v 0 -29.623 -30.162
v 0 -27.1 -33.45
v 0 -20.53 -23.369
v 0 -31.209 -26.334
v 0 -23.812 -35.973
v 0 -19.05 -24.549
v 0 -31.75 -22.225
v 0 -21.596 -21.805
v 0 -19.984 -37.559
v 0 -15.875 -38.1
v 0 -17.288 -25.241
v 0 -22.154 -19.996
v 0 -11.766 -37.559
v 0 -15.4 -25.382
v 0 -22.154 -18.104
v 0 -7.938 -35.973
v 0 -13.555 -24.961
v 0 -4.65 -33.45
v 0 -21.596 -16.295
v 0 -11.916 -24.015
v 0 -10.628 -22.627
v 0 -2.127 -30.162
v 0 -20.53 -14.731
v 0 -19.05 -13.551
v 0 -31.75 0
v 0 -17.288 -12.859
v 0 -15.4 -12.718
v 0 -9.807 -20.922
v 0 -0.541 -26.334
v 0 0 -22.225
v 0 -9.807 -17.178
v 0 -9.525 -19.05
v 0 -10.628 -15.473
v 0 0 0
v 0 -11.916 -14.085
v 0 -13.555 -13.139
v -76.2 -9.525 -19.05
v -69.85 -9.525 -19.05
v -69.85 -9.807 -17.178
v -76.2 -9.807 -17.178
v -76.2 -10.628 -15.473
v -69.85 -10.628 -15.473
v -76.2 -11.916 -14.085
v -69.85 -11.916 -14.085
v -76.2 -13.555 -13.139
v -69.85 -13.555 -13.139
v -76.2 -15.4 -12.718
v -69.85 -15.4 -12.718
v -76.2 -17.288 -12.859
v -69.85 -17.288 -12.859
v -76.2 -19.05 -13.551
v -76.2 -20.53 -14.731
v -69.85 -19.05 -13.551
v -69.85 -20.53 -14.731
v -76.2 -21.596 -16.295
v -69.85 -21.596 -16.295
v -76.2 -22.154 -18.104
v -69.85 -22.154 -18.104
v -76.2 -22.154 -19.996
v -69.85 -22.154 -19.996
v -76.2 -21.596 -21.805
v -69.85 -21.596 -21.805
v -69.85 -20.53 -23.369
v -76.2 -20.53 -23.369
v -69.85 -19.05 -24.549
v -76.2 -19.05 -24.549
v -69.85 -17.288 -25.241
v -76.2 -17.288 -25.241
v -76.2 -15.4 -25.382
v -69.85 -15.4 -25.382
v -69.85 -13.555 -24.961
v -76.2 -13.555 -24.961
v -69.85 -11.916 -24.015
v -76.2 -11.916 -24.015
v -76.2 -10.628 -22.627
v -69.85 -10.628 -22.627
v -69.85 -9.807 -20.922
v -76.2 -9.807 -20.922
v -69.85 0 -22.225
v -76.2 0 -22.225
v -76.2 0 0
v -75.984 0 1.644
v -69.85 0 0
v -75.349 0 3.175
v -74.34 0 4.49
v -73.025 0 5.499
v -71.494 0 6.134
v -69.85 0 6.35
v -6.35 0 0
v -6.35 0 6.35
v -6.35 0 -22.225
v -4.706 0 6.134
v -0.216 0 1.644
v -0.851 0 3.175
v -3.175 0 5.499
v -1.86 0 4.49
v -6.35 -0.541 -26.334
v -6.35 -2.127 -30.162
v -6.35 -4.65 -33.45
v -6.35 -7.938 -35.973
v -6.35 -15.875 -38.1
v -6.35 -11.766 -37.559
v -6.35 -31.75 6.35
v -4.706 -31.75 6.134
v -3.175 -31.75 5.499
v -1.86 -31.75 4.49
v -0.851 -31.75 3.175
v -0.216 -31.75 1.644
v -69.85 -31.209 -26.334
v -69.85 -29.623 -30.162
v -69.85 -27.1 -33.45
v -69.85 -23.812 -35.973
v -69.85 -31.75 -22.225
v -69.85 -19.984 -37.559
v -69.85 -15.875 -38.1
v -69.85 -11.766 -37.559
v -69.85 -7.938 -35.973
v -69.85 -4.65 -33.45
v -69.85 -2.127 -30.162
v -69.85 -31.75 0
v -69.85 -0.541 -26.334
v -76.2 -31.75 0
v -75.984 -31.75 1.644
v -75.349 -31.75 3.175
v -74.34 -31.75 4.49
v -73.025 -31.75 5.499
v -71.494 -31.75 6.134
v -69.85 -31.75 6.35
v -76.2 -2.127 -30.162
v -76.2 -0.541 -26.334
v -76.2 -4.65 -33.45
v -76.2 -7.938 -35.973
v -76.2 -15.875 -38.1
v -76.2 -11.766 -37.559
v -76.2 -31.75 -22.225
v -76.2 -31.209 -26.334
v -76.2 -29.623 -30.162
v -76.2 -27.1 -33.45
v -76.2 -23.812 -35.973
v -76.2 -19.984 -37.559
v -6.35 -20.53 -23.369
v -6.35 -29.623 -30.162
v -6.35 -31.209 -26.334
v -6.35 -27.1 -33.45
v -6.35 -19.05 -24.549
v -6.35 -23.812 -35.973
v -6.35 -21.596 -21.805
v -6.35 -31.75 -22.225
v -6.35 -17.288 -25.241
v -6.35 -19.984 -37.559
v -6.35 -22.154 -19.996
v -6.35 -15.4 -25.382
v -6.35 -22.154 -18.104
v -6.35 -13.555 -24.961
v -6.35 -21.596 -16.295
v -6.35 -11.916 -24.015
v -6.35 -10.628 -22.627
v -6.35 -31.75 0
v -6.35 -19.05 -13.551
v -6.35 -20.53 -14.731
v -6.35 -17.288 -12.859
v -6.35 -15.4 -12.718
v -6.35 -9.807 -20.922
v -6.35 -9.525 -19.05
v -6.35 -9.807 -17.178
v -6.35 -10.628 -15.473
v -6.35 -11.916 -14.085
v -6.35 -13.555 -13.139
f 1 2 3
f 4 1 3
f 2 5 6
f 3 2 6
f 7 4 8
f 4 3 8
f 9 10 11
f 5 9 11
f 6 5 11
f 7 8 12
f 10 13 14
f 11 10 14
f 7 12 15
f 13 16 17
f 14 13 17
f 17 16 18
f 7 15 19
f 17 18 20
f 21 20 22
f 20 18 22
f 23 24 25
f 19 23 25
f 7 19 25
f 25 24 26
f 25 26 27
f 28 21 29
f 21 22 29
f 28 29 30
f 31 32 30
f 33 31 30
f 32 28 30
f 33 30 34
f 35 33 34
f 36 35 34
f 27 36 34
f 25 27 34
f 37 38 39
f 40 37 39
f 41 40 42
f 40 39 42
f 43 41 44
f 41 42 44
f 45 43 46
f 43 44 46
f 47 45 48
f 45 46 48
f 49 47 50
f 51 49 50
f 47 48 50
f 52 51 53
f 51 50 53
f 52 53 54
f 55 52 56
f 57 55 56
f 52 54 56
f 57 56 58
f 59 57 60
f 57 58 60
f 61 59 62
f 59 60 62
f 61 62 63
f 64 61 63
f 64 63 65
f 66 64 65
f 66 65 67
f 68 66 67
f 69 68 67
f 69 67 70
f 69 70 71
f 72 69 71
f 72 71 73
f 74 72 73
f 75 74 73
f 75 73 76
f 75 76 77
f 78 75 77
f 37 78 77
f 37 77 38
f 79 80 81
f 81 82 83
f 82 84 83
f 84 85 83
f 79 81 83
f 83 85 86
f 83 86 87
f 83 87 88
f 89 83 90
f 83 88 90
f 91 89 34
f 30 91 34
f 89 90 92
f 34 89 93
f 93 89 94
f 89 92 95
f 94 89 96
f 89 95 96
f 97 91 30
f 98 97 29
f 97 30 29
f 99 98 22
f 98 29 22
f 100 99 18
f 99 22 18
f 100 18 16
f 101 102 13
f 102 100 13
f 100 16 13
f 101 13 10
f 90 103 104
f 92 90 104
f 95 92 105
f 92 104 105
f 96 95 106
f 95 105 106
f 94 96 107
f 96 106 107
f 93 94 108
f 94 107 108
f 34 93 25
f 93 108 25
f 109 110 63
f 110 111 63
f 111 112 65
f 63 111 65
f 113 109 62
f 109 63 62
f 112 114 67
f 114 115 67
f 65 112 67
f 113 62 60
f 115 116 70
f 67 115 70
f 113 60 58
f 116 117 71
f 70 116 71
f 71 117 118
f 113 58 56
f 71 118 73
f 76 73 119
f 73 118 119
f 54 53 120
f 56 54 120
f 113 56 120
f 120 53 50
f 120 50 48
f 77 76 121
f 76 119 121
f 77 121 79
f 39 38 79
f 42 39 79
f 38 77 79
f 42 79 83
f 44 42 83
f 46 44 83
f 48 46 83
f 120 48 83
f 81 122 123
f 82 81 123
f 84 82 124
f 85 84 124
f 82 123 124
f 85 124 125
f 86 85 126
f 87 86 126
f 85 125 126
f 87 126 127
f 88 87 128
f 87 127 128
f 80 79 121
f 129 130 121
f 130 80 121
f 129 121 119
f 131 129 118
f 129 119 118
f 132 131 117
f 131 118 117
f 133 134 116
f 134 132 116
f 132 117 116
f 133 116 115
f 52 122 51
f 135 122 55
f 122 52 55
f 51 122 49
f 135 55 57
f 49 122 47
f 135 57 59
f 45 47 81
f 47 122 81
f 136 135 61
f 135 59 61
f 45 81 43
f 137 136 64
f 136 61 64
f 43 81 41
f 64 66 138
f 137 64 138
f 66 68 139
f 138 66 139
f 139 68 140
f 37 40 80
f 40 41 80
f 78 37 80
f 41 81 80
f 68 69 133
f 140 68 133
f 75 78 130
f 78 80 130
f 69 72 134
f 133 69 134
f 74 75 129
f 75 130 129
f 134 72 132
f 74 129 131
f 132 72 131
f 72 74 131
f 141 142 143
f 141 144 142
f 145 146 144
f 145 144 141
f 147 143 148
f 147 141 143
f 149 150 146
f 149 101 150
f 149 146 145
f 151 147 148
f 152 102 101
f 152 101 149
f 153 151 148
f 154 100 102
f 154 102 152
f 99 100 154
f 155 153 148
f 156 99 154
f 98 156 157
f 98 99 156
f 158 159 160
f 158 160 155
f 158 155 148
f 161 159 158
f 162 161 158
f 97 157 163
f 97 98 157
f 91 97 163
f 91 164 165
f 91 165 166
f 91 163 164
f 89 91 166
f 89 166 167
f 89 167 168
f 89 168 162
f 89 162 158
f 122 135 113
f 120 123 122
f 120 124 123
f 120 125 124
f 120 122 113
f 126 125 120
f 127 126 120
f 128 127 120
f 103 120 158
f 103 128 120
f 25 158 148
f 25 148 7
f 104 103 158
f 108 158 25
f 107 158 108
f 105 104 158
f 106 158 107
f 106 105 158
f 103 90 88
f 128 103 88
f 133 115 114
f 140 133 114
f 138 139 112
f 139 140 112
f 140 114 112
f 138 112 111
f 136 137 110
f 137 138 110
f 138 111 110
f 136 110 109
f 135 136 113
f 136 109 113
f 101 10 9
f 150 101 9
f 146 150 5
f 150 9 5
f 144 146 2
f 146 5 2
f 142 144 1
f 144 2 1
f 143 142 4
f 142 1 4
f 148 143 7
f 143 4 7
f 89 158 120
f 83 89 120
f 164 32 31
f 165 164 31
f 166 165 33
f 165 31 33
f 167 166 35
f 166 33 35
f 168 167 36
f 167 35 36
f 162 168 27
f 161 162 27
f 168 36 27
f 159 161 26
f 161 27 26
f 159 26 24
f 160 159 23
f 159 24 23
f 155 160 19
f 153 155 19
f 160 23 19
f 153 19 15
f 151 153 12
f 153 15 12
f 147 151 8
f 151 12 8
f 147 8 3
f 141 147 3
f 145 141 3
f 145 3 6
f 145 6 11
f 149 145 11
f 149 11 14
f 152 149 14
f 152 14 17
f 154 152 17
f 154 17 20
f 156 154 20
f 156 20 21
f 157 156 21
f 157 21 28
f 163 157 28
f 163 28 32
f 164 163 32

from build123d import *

# Parameters (mm, degrees)
F0_W     = 6.35
F0_H     = 38.1
F1_DEPTH = 31.75
F2_R     = 6.35
F3_DEPTH = 127
F5_DEPTH = 127
F7_DEPTH = 31.75
F8_DEPTH = 31.75


with BuildPart() as f1:
    # F0 (on Front) → F1 (new body)
    with BuildSketch(Plane.XZ):
        with Locations((-3.175, -19.05)):
            Rectangle(F0_W, F0_H)
        Polygon((-6.35, 0), (0, 0), (0, 6.35), (-76.2, 6.35), (-76.2, 0), (-69.85, 0), align=None)
        with Locations((-73.025, -19.05)):
            Rectangle(F0_W, F0_H)
    extrude(amount=F1_DEPTH)

    # F2 (on face) → F3 (cut)
    with BuildSketch(Plane.YZ):
        with Locations((-15.875, -19.05)):
            Circle(F2_R)
    extrude(amount=-F3_DEPTH, mode=Mode.SUBTRACT)

    # F4 (on face) → F5 (cut)
    with BuildSketch(Plane.YZ):
        with BuildLine():
            ThreePointArc((-15.875, -38.1), (-27.10032, -33.45032), (-31.75, -22.225))
            Line((-31.75, -22.225), (-31.75, -38.1))
            Line((-31.75, -38.1), (-15.875, -38.1))
        make_face()
        with BuildLine():
            Line((0, -38.1), (0, -22.225))
            ThreePointArc((0, -22.225), (-4.64968, -33.45032), (-15.875, -38.1))
            Line((-15.875, -38.1), (0, -38.1))
        make_face()
    extrude(amount=-F5_DEPTH, mode=Mode.SUBTRACT)

    # F6 (on face) → F7 (join)
    with BuildSketch(Plane.XZ.offset(31.75)):
        with BuildLine():
            Line((-63.5, 0), (-69.85, 0))
            Line((-69.85, 0), (-69.85, -6.35))
            ThreePointArc((-69.85, -6.35), (-67.990128, -1.859872), (-63.5, 0))
        make_face()
        with BuildLine():
            Line((-6.35, -6.35), (-6.35, 0))
            Line((-6.35, 0), (-12.7, 0))
            ThreePointArc((-12.7, 0), (-8.209872, -1.859872), (-6.35, -6.35))
        make_face()
    extrude(amount=-F7_DEPTH)

    # F6 (on face) → F8 (cut)
    with BuildSketch(Plane.XZ.offset(31.75)):
        with BuildLine():
            ThreePointArc((-76.2, 0), (-74.340128, 4.490128), (-69.85, 6.35))
            Line((-69.85, 6.35), (-76.2, 6.35))
            Line((-76.2, 6.35), (-76.2, 0))
        make_face()
        with BuildLine():
            Line((0, 6.35), (-6.35, 6.35))
            ThreePointArc((-6.35, 6.35), (-1.859872, 4.490128), (0, 0))
            Line((0, 0), (0, 6.35))
        make_face()
        with BuildLine():
            Line((-63.5, 0), (-69.85, 0))
            Line((-69.85, 0), (-69.85, -6.35))
            ThreePointArc((-69.85, -6.35), (-67.990128, -1.859872), (-63.5, 0))
        make_face()
        with BuildLine():
            Line((-6.35, -6.35), (-6.35, 0))
            Line((-6.35, 0), (-12.7, 0))
            ThreePointArc((-12.7, 0), (-8.209872, -1.859872), (-6.35, -6.35))
        make_face()
    extrude(amount=-F8_DEPTH, mode=Mode.SUBTRACT)


solid = f1.part
